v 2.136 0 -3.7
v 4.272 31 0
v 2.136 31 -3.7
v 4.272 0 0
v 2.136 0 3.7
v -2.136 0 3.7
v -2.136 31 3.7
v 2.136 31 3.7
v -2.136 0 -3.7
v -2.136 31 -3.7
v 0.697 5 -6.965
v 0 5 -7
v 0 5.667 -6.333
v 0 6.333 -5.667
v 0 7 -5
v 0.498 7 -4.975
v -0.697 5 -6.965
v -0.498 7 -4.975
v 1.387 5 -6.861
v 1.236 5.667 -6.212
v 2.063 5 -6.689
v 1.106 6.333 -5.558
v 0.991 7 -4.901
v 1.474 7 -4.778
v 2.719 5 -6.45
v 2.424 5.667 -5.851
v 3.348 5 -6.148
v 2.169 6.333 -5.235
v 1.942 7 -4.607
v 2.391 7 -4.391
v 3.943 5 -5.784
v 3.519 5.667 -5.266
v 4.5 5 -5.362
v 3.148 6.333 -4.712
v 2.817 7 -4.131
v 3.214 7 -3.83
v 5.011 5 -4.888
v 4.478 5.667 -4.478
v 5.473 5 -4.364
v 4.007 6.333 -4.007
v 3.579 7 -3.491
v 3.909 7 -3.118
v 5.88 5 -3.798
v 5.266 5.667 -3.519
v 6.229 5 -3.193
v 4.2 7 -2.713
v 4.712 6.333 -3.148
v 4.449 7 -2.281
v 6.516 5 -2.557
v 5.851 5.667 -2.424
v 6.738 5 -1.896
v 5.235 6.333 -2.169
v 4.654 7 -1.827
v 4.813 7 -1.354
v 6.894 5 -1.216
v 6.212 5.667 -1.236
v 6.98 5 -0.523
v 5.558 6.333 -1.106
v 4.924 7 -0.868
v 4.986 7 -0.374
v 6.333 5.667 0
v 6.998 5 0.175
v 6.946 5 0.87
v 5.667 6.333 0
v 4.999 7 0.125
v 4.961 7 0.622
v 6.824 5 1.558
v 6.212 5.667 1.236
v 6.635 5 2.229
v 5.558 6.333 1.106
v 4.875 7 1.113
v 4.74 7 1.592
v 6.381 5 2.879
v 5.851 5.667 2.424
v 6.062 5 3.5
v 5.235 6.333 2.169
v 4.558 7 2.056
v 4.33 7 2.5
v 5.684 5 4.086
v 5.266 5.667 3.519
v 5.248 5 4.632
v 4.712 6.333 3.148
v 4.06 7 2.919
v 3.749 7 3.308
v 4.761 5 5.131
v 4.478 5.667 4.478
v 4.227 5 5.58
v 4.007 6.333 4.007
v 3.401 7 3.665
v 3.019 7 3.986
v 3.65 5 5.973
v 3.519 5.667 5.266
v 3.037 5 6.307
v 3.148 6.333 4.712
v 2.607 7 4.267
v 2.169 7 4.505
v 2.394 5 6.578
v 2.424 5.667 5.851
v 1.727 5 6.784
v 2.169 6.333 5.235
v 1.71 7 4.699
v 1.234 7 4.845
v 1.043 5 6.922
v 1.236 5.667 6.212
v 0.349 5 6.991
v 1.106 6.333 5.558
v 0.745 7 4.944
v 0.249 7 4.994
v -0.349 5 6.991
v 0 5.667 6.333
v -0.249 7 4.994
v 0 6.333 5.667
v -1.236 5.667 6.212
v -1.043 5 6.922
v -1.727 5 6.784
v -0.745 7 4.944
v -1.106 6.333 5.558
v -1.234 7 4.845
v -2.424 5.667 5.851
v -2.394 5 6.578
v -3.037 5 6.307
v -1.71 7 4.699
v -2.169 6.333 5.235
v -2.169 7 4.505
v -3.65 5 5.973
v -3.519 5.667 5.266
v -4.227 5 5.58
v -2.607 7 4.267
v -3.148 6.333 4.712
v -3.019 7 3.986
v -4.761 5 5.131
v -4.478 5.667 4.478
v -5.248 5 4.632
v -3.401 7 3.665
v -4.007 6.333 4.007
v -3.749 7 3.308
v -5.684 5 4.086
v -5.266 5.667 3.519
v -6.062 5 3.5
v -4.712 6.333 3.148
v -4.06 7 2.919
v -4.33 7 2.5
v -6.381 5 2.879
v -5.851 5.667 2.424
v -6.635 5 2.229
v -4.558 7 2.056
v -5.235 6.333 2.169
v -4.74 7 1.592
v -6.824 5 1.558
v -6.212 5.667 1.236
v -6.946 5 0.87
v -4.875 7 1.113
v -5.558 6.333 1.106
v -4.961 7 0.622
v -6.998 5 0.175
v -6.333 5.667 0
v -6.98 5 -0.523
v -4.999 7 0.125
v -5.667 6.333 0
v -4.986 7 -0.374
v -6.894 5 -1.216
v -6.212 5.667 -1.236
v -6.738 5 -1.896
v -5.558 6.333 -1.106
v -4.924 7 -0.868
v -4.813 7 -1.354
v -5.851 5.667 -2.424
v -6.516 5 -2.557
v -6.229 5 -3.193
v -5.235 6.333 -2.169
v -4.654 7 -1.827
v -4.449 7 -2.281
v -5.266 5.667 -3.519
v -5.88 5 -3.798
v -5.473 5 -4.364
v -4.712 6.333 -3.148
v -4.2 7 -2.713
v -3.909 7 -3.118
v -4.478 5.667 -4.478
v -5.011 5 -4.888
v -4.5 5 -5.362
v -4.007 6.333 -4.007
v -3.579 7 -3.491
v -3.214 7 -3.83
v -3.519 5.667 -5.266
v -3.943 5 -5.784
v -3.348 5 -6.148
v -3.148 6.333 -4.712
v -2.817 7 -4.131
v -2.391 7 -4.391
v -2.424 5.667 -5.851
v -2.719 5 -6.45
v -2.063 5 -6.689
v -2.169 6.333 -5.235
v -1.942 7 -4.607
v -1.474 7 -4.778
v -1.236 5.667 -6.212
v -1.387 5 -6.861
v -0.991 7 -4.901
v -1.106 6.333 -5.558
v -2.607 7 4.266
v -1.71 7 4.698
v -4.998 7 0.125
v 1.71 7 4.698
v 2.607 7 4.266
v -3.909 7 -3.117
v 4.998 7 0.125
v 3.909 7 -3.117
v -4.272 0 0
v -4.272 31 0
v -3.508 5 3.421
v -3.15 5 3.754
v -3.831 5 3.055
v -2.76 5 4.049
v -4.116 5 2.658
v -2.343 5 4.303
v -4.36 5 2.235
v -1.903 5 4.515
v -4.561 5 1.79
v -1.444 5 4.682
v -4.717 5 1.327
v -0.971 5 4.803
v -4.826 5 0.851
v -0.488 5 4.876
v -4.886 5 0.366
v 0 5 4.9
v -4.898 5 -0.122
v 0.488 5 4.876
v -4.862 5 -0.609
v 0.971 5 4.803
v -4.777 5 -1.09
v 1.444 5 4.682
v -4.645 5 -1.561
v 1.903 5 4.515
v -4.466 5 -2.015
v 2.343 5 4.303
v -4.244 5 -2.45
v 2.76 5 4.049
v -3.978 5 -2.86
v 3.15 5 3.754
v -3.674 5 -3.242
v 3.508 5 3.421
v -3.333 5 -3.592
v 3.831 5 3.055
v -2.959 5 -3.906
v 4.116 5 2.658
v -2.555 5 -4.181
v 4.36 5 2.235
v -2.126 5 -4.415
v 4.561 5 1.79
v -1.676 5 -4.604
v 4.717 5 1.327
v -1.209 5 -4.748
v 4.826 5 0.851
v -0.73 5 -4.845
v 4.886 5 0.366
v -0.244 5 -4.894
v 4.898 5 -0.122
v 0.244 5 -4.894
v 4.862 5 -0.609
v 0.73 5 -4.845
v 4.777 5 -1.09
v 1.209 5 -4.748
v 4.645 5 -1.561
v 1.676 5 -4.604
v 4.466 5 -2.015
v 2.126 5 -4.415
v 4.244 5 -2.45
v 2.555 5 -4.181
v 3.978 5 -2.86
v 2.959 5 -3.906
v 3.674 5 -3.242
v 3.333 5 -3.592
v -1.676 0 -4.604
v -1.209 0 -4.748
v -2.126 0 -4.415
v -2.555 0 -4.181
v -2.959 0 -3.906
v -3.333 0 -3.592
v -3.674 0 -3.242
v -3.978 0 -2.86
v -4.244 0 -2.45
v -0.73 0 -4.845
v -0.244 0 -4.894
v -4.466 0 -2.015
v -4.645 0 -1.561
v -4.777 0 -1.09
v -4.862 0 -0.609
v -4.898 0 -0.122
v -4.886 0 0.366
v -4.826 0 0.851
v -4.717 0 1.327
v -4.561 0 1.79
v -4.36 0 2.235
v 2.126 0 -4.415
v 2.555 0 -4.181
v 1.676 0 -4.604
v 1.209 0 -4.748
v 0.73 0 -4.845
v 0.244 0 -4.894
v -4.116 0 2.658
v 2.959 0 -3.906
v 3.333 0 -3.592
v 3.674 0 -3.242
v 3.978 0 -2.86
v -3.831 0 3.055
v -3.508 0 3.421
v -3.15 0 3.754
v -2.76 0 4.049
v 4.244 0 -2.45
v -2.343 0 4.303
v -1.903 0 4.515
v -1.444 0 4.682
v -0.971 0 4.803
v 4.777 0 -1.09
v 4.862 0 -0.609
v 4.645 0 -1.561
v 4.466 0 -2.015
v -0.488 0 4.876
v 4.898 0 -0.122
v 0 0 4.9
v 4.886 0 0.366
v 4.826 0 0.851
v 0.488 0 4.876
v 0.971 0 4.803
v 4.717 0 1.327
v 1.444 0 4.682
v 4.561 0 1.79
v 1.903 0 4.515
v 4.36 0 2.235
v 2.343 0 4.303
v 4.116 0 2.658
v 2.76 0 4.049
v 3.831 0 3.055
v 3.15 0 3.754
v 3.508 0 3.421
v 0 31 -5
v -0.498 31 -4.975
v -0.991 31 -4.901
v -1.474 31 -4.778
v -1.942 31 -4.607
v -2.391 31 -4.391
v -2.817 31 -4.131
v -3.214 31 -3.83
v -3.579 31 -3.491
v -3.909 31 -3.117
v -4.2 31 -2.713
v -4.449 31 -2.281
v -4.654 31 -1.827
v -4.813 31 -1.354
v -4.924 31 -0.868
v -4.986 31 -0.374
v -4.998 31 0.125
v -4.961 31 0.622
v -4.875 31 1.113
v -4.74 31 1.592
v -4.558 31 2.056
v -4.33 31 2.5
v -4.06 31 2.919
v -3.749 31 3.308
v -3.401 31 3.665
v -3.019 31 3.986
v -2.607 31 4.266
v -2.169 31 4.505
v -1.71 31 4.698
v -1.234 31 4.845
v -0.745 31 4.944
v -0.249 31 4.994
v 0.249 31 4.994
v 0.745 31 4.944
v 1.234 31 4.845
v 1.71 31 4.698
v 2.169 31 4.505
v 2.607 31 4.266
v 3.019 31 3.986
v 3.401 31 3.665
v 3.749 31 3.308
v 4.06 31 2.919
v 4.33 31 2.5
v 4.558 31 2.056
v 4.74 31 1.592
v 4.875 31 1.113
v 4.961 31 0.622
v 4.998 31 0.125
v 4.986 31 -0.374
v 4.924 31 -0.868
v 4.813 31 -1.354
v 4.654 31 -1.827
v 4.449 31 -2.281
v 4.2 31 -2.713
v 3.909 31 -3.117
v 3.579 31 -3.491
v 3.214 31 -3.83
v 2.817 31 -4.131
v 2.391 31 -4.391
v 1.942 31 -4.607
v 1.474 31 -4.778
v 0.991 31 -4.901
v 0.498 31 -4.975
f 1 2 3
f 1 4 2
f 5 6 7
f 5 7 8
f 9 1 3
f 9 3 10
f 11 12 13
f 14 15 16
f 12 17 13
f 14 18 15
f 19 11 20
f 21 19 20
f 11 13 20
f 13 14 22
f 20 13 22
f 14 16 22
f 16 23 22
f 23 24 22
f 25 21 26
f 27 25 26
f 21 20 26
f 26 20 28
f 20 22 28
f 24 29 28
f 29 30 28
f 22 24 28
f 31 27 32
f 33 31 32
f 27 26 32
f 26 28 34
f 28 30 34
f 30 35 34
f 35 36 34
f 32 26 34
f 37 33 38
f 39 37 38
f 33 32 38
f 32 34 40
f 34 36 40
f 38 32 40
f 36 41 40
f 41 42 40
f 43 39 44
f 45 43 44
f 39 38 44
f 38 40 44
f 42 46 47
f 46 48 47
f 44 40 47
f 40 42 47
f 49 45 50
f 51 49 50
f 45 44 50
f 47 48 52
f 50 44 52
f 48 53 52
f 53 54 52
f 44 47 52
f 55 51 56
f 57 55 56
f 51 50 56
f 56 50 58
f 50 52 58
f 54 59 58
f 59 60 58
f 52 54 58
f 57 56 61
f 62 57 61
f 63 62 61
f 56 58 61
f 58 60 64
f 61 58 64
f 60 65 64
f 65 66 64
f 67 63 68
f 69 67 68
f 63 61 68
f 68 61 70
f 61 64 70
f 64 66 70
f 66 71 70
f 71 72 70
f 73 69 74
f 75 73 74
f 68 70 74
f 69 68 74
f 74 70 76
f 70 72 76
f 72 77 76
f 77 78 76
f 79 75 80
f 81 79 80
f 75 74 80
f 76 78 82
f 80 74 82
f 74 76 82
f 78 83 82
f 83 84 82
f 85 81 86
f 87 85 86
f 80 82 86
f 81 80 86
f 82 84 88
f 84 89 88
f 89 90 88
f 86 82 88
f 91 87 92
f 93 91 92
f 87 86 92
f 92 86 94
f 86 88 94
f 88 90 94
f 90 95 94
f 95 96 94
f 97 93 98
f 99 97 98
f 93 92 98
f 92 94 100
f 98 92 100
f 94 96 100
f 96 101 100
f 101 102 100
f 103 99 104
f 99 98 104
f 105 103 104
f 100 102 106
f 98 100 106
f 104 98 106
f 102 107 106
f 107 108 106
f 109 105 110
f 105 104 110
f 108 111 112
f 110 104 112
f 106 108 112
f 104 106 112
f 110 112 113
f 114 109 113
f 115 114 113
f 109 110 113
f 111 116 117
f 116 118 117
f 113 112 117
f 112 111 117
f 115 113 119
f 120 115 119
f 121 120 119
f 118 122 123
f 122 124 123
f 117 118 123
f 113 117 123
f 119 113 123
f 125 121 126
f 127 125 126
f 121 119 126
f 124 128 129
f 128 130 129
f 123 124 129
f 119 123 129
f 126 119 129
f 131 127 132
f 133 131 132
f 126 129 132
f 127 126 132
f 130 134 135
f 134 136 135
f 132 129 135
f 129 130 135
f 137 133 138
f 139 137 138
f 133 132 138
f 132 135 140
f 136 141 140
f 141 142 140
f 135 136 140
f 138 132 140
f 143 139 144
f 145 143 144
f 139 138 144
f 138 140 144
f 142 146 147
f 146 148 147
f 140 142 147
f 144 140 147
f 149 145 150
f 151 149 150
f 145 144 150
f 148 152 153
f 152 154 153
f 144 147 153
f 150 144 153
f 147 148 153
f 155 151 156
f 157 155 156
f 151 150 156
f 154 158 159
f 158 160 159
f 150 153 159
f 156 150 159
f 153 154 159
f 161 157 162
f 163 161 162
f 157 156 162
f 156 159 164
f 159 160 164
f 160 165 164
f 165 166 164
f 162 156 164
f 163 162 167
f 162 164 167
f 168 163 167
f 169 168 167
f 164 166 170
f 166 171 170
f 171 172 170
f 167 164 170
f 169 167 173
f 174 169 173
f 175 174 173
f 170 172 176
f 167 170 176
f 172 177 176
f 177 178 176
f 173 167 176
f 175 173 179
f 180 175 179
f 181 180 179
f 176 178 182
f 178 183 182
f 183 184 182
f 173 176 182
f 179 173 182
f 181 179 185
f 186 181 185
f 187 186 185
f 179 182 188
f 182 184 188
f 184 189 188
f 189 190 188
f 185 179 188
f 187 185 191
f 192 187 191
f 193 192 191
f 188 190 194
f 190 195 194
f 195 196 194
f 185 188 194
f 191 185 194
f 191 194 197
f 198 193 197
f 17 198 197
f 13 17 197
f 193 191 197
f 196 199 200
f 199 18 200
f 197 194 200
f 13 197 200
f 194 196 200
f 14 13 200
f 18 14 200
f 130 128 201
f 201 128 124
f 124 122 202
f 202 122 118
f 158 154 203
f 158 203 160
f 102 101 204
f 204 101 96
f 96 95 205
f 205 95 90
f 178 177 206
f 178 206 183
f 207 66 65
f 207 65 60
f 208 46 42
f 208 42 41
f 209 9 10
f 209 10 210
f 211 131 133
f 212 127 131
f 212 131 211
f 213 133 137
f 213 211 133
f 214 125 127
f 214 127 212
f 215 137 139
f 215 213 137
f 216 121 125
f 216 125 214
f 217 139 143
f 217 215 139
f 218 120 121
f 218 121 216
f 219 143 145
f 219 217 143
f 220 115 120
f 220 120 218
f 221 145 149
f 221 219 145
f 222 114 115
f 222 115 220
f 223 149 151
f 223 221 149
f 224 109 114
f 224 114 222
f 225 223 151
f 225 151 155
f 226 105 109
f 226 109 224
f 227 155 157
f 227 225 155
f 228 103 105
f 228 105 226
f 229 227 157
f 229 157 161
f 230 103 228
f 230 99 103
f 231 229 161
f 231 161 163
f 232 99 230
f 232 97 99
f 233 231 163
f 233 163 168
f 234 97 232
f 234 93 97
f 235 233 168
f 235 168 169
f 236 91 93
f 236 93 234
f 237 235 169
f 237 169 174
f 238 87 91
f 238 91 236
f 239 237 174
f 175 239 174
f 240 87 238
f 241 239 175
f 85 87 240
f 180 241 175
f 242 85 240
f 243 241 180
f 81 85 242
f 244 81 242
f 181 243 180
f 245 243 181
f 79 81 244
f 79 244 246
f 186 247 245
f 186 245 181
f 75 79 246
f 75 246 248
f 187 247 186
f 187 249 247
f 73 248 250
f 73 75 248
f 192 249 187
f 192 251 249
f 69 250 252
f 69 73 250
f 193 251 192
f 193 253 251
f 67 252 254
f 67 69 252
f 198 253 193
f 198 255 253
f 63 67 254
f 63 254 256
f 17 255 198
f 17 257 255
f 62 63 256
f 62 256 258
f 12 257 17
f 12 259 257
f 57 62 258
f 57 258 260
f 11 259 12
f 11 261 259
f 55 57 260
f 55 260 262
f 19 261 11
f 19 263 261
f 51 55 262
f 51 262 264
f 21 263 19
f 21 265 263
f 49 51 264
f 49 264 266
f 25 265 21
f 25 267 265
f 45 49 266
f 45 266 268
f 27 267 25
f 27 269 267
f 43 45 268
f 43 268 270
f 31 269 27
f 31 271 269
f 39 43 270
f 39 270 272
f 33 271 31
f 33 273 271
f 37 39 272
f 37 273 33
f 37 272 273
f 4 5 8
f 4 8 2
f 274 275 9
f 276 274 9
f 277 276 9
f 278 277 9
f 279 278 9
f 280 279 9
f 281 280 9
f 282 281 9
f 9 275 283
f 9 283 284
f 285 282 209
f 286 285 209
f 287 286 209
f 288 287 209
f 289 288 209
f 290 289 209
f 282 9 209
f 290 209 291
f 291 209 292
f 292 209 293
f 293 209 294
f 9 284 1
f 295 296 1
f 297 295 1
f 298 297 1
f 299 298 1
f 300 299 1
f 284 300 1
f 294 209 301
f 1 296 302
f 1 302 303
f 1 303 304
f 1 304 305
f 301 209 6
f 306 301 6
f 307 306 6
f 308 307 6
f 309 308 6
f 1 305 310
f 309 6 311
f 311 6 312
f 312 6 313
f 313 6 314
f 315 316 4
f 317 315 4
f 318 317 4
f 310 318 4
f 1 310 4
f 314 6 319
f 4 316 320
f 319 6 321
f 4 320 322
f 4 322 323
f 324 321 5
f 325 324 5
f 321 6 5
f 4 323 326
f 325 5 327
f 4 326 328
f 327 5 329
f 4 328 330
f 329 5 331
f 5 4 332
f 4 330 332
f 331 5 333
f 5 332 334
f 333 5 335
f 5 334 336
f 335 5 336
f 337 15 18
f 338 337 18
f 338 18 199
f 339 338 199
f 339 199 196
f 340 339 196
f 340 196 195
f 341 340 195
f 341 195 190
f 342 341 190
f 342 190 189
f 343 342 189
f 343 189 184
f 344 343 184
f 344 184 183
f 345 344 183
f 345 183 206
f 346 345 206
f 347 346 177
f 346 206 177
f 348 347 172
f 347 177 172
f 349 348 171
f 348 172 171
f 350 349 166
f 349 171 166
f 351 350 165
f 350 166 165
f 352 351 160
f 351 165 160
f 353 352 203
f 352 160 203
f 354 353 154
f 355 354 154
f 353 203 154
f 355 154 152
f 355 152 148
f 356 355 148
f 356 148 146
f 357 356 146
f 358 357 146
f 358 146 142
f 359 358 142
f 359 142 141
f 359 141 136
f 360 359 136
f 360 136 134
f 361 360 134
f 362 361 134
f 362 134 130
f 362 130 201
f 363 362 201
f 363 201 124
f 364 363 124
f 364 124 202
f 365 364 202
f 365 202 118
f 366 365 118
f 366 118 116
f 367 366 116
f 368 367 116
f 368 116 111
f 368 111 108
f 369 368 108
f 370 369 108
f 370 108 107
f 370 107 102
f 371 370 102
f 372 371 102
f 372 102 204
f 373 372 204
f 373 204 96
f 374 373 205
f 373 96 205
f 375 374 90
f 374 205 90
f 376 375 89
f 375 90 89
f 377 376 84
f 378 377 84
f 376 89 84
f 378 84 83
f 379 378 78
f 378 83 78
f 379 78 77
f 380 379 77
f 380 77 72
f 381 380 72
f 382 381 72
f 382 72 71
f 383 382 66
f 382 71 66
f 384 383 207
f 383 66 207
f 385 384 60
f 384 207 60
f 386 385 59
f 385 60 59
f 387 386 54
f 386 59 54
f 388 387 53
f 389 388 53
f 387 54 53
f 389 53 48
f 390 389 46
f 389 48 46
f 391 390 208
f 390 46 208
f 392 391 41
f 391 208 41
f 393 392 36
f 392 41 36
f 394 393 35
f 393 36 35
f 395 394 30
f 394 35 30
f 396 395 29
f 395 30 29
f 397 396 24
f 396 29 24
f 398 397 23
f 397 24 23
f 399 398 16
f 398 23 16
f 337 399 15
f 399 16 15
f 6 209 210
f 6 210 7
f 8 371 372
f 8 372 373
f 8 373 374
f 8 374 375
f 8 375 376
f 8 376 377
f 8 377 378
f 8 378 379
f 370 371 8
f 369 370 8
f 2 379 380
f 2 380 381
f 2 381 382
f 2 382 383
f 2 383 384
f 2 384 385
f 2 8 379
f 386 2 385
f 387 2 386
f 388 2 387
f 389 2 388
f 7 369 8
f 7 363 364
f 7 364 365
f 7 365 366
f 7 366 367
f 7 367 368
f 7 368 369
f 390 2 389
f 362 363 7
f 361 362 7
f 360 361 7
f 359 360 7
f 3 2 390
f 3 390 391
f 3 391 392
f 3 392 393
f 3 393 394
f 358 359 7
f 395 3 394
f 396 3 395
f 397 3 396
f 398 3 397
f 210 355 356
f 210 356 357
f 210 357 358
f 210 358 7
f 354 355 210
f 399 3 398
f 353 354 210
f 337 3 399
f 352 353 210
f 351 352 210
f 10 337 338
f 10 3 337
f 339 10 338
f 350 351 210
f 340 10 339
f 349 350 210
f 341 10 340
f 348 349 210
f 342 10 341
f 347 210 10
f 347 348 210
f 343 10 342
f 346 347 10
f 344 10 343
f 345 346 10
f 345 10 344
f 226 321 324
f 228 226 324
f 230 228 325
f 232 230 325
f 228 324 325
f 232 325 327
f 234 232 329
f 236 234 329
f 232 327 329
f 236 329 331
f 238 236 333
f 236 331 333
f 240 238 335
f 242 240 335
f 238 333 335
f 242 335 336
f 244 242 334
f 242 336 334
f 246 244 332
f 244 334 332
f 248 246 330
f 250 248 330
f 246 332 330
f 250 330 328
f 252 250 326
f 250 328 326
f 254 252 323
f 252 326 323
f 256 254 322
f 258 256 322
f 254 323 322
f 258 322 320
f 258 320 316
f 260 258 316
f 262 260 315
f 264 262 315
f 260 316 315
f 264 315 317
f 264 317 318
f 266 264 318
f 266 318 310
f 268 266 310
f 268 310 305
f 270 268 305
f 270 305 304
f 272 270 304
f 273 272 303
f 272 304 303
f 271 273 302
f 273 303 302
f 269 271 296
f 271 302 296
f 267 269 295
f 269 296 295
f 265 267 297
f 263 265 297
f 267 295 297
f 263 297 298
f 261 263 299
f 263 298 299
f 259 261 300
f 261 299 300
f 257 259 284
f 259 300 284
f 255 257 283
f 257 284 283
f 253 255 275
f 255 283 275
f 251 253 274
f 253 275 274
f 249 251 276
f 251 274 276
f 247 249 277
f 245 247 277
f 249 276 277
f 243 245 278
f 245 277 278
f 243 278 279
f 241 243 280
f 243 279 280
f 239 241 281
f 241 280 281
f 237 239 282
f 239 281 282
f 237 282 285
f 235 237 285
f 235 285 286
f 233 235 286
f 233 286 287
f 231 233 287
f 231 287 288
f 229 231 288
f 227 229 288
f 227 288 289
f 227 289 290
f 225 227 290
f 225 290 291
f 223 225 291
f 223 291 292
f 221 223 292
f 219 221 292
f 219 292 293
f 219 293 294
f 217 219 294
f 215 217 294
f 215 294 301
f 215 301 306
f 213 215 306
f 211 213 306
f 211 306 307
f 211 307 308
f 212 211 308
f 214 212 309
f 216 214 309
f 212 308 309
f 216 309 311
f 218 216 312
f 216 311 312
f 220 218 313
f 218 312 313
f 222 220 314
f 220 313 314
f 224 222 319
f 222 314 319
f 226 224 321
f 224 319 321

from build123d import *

# Parameters (mm, degrees)
SKETCH_1_R      = 4.9
EXTRUDE_1_DEPTH = 5
SKETCH_2_R      = 5
EXTRUDE_2_DEPTH = 26
SKETCH_5_R      = 7
SKETCH_5_R_2    = 5
EXTRUDE_4_DEPTH = 2
CHAMFER_1_SIZE  = 2


with BuildPart() as part:
    # 草图1 → 凸台-拉伸1 (new body)
    with BuildSketch(Plane(origin=(0, 0, 0), x_dir=(1, 0, 0), z_dir=(0, 1, 0))):
        with Locations(Location((0, 0, 0), (0, 0, 270))):
            Circle(SKETCH_1_R)
        Polygon((4.272391992, 0), (2.136195996, 3.7), (-2.136195996, 3.7), (-4.272391992, 0), (-2.136195996, -3.7), (2.136195996, -3.7), align=None, mode=Mode.SUBTRACT)
    extrude(amount=EXTRUDE_1_DEPTH)

    # 草图2 → 凸台-拉伸2 (add)
    with BuildSketch(Plane(origin=(0, 5, 0), x_dir=(1, 0, 0), z_dir=(0, 1, 0))):
        with Locations(Location((0, 0, 0), (0, 0, 90))):
            Circle(SKETCH_2_R)
        Polygon((4.272391992, 0), (2.136195996, 3.7), (-2.136195996, 3.7), (-4.272391992, 0), (-2.136195996, -3.7), (2.136195996, -3.7), align=None, mode=Mode.SUBTRACT)
    extrude(amount=EXTRUDE_2_DEPTH)

    # 草图5 → 凸台-拉伸4 (add)
    with BuildSketch(Plane.XZ.offset(-5)):
        with Locations(Location((0, 0, 0), (0, 0, 270))):
            Circle(SKETCH_5_R)
        with Locations(Location((0, 0, 0), (0, 0, 270))):
            Circle(SKETCH_5_R_2, mode=Mode.SUBTRACT)
    extrude(amount=-EXTRUDE_4_DEPTH)

    # 倒角1
    chamfer_1_edges = [part.edges().sort_by_distance(p)[0] for p in [
        (0, 7, 7),
    ]]
    chamfer(chamfer_1_edges, length=CHAMFER_1_SIZE - 0.0001)  # a hair under: the kernel refuses the full size


solid = part.part
